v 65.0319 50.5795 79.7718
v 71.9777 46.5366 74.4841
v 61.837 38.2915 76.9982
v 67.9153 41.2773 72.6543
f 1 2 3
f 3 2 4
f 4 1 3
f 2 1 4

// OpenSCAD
// Auto-generated auxetic polyhedron
points = [
    [61.837028, 38.291501, 76.998245],
    [71.977651, 46.536569, 74.484131],
    [65.031856, 50.579509, 79.771826],
    [67.915249, 41.277303, 72.654258],
];

faces = [
    [0, 1, 2],
    [3, 1, 0],
    [0, 2, 3],
    [3, 2, 1],
];

polyhedron(points = points, faces = faces);
